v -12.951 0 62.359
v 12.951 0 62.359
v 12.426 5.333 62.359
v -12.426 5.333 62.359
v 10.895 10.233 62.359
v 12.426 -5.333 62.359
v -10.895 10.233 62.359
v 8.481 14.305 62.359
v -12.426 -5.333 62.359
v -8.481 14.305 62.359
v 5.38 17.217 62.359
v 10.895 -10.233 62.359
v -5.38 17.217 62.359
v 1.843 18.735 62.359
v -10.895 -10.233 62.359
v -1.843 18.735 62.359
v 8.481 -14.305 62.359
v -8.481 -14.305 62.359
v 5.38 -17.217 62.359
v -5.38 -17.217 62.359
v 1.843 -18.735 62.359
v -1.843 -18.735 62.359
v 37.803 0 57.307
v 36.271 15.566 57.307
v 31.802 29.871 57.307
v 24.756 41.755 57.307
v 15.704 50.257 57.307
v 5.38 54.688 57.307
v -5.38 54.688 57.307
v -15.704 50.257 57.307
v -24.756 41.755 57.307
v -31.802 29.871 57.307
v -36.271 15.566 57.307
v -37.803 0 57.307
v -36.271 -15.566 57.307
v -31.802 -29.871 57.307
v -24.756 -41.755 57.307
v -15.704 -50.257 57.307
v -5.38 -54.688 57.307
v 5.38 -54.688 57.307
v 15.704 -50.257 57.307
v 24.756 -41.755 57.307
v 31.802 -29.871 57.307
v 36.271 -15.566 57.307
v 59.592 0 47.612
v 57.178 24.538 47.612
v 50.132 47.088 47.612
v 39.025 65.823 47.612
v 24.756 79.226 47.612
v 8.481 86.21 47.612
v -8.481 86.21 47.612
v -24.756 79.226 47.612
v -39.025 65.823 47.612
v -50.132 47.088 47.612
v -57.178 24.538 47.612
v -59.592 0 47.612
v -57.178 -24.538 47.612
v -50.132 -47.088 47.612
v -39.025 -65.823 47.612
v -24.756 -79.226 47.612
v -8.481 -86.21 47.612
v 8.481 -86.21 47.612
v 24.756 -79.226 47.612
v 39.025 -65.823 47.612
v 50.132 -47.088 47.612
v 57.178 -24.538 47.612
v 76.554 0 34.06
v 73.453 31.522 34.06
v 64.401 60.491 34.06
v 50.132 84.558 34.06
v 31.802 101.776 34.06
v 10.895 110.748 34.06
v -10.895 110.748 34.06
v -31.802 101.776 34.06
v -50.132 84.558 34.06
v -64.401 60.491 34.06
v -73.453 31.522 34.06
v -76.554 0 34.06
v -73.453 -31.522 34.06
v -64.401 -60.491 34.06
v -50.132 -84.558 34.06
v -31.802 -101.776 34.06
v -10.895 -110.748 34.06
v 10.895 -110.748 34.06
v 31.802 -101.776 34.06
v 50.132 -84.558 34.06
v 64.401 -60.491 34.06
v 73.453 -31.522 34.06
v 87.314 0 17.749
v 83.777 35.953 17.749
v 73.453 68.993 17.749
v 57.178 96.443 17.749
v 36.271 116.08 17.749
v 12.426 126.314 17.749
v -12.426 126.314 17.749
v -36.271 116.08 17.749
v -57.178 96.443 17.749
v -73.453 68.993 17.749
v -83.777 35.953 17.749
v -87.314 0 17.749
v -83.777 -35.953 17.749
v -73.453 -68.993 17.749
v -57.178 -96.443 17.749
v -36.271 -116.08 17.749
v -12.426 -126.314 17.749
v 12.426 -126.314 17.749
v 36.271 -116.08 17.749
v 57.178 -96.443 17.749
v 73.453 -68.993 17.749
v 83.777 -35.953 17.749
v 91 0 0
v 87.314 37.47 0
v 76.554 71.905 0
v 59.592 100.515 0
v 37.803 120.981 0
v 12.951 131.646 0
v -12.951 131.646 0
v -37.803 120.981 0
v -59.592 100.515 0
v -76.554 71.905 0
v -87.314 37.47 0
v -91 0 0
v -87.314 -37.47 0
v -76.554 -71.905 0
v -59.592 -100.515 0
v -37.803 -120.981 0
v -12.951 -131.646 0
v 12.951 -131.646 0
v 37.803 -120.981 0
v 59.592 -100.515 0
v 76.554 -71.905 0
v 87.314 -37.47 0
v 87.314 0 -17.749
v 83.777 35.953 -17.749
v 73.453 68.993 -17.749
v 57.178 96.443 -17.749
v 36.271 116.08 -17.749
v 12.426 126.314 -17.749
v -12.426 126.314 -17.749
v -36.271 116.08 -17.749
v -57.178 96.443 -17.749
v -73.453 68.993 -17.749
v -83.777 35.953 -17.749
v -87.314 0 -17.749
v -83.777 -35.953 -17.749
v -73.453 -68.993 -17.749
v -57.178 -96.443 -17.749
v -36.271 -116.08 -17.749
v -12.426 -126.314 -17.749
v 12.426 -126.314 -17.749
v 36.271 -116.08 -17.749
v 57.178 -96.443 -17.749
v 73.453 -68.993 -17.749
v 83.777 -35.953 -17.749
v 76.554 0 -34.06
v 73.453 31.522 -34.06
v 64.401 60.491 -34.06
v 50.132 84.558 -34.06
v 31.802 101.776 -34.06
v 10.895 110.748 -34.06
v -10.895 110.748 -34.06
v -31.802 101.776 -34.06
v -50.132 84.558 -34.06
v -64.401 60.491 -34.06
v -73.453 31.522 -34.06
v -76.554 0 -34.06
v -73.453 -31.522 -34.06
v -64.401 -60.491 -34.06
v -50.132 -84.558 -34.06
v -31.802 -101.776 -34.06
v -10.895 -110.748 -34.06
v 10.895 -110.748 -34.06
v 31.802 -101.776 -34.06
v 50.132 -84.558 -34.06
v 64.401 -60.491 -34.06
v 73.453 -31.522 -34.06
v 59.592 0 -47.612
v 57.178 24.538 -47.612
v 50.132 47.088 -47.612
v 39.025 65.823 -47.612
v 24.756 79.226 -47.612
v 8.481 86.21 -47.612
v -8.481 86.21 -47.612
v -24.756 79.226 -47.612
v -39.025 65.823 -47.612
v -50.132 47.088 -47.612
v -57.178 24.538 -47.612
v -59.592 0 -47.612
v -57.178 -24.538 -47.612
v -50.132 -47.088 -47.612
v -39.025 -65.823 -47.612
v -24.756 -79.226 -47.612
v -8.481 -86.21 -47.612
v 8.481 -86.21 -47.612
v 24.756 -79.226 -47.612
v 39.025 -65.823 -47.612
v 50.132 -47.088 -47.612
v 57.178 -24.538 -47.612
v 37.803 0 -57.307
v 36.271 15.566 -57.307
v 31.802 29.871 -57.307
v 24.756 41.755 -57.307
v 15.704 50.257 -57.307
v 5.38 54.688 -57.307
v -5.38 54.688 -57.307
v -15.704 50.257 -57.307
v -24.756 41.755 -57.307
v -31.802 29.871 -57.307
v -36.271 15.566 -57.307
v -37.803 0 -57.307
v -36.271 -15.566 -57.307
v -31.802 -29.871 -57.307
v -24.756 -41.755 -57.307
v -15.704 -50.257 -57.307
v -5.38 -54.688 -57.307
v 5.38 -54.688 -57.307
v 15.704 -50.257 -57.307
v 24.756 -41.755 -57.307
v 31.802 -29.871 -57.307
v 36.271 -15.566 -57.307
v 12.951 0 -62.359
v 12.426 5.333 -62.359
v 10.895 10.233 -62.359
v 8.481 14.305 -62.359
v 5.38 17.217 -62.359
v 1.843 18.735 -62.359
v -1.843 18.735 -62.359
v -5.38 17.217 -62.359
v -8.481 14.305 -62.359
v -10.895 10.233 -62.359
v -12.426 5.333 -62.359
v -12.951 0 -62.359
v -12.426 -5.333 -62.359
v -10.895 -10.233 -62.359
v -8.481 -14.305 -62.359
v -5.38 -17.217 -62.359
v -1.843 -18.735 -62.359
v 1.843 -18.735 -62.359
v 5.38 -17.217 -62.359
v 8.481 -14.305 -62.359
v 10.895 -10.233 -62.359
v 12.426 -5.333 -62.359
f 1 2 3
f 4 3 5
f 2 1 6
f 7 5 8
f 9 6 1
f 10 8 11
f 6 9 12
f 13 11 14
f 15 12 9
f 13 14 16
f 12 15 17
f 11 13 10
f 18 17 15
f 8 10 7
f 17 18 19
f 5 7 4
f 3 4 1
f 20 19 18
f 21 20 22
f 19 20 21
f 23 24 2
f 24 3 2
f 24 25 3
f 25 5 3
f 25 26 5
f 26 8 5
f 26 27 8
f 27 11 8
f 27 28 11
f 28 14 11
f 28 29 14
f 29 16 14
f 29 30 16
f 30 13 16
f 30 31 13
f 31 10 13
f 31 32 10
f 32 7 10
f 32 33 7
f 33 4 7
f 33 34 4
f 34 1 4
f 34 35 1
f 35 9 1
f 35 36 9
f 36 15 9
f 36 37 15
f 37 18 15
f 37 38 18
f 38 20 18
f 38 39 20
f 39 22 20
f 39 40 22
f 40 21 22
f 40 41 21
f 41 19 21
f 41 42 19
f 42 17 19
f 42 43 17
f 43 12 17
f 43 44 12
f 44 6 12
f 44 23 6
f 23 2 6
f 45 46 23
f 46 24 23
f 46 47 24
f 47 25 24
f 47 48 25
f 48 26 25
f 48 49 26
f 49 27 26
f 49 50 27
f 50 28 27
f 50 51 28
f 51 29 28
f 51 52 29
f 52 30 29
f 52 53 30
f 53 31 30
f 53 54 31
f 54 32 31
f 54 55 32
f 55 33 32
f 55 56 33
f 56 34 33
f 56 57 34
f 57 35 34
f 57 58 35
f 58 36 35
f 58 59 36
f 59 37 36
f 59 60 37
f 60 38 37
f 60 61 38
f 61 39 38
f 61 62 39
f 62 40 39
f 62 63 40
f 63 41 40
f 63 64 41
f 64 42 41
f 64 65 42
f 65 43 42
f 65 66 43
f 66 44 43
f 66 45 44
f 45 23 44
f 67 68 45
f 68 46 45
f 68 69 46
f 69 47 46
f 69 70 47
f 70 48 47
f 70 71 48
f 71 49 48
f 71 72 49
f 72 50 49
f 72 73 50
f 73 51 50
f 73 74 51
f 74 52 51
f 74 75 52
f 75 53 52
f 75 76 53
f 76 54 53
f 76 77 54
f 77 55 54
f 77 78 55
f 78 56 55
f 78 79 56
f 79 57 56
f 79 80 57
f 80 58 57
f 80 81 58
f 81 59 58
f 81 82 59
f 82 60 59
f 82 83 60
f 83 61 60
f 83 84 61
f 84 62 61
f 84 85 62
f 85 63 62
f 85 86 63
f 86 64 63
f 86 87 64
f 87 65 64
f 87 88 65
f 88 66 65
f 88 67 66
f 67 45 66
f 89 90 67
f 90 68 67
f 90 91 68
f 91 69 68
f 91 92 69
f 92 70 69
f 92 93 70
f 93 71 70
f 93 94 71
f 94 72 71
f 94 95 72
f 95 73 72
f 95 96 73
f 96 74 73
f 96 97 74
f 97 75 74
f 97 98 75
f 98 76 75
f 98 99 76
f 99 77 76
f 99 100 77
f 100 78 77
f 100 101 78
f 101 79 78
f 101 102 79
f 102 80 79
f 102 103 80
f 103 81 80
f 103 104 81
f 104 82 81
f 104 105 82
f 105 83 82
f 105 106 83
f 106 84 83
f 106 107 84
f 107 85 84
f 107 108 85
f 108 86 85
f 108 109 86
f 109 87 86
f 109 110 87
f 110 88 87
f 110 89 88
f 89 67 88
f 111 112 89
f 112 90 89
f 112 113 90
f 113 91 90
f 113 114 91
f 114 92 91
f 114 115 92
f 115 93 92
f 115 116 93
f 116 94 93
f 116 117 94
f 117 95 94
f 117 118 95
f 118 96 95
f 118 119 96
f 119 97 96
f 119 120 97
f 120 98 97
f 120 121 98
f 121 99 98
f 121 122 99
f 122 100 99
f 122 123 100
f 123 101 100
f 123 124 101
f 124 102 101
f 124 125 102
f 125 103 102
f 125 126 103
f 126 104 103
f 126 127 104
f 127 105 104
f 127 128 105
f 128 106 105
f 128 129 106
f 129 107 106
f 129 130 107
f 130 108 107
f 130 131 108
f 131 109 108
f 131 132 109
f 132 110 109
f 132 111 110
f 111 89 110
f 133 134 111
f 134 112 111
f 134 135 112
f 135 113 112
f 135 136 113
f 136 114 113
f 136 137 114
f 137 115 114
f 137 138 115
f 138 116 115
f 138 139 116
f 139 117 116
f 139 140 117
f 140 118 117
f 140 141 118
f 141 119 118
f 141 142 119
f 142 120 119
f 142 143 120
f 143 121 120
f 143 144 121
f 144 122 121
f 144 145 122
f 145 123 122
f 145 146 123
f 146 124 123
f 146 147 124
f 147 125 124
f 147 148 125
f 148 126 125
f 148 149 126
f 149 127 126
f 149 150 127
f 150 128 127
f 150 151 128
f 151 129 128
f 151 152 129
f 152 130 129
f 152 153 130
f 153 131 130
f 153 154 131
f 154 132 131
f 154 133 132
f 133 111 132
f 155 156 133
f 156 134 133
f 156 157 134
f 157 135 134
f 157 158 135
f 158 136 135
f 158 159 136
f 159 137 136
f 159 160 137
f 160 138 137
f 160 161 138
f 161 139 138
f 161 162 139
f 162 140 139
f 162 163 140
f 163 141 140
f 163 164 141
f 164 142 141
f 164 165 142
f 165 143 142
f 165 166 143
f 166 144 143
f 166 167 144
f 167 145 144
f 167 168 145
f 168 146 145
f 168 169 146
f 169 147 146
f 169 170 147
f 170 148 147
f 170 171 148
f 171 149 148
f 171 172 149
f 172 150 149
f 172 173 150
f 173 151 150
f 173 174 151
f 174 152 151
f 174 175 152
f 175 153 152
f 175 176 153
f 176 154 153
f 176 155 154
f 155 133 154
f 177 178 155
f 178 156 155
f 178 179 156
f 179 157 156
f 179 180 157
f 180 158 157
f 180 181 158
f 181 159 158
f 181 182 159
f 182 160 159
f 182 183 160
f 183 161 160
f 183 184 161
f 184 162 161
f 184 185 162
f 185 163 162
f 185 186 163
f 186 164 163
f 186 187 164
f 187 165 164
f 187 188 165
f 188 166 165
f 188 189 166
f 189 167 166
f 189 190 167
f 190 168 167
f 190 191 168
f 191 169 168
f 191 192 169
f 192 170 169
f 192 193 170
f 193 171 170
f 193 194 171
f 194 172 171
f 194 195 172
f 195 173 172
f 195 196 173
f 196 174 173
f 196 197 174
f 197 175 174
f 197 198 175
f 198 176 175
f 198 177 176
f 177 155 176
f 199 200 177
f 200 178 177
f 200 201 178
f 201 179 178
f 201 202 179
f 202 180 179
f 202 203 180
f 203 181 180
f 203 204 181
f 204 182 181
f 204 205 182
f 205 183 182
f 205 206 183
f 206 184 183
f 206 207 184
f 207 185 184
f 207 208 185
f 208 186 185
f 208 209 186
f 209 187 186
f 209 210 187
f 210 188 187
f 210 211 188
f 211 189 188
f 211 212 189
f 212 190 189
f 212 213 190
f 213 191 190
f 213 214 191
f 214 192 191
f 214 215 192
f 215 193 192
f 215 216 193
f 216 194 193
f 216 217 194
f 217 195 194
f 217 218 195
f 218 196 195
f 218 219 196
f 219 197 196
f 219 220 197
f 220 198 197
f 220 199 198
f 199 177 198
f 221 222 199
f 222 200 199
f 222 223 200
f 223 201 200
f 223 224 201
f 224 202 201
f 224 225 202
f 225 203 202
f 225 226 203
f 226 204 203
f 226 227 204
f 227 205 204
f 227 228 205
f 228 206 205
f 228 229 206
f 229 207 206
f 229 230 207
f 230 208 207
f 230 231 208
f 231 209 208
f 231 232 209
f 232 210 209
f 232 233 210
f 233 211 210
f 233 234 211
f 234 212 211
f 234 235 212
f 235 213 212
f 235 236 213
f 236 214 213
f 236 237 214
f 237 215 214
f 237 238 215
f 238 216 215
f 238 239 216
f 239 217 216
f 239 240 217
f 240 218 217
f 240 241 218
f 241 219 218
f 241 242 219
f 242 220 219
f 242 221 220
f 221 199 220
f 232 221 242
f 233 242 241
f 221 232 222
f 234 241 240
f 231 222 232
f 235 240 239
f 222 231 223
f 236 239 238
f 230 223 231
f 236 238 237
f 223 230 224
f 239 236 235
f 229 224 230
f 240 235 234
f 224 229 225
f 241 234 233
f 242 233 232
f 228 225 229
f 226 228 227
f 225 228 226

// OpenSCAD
// Generated by SolidPython 1.0.1 on 2020-07-29 00:46:51


scale(v = [13, 19, 9]) {
	sphere(r = 7);
}
/***********************************************
*********      SolidPython code:      **********
************************************************
 
# import packages: SolidPython
from solid import *
from solid.utils import *
from itertools import chain, combinations, permutations


class Resize:

    def __init__(self, scad_file):
        self.scad_file = scad_file
        #self.scad_file = import_scad(scad_file)
        # cone/cylinder param:
        self.r1 = 0
        self.r2 = 0
        self.h = 0
        # rectangular prism param:
        self.w = 0
        self.l = 0
        # ellipse param:
        self.r = 0

    # import OpenScad code (file name corresponds to shape)


    # classify shape + parameters
    def assign(self, param1, param2, param3):
        if self.scad_file == 'cone.scad':
            self.r1 = param1
            self.r2 = param2
            self.h = param3
        elif self.scad_file == 'cylinder.scad':
            self.r1 = param1
            self.r2 = param2
            self.h = param3
        elif self.scad_file == 'rectangularPrism.scad':
            self.h = param1
            self.l = param2
            self.w = param3
        else:
            self.r = param1
            self.h = param2

    # resize parameters
    def iterate(self):
        x = range(3, 20, 2)
        i = 1
        if self.scad_file == 'cone.scad':
            tempList = list(permutations(x, 2))
            for temp in tempList:
                param1 = temp[0]
                param2 = temp[1]
                filepath = 'produced_scad_files/' + 'cone' + str(param1) + '_' + str(param2) + '_' + '.scad'
                scad_render_to_file(cylinder(h=param1, r1=param2, r2=0), filepath)

        elif self.scad_file == 'cylinder.scad':
            tempList = list(permutations(x, 3))
            for temp in tempList:
                param1 = temp[0]
                param2 = temp[1]
                filepath = 'produced_scad_files/' + 'cylinder' + str(param1) + '_' + str(param2) + '_' + '.scad'
                scad_render_to_file(cylinder(h=param1, r1=param2, r2=param2), filepath)

        elif self.scad_file == 'rectangularPrism.scad':
            tempList = list(permutations(x, 3))
            for temp in tempList:
                param1 = temp[0]
                param2 = temp[1]
                param3 = temp[2]
                filepath = 'produced_scad_files/' + 'rectangularPrism' + str(param1) + '_' + str(param2) + '_' + str(
                    param3) + '.scad'
                scad_render_to_file(cube(size=(param1, param2, param3)), filepath)

        elif self.scad_file == 'ellipse.scad':
            tempList = list(permutations(x, 4))
            for temp in tempList:
                param1 = temp[0]
                param2 = temp[1]
                param3 = temp[2]
                param4 = temp[3]
                filepath = 'produced_scad_files/' + 'ellipse' + str(param1) + '_' + str(param2) + '_' + str(param3) + '_' + str(param4) + '.scad'
                scad_render_to_file(scale([param1, param2, param3])(sphere(r=param4)), filepath)

    def render_to_scadfile(self):
        scad_render_to_file(scad, 'example.scad') 
 
************************************************/
